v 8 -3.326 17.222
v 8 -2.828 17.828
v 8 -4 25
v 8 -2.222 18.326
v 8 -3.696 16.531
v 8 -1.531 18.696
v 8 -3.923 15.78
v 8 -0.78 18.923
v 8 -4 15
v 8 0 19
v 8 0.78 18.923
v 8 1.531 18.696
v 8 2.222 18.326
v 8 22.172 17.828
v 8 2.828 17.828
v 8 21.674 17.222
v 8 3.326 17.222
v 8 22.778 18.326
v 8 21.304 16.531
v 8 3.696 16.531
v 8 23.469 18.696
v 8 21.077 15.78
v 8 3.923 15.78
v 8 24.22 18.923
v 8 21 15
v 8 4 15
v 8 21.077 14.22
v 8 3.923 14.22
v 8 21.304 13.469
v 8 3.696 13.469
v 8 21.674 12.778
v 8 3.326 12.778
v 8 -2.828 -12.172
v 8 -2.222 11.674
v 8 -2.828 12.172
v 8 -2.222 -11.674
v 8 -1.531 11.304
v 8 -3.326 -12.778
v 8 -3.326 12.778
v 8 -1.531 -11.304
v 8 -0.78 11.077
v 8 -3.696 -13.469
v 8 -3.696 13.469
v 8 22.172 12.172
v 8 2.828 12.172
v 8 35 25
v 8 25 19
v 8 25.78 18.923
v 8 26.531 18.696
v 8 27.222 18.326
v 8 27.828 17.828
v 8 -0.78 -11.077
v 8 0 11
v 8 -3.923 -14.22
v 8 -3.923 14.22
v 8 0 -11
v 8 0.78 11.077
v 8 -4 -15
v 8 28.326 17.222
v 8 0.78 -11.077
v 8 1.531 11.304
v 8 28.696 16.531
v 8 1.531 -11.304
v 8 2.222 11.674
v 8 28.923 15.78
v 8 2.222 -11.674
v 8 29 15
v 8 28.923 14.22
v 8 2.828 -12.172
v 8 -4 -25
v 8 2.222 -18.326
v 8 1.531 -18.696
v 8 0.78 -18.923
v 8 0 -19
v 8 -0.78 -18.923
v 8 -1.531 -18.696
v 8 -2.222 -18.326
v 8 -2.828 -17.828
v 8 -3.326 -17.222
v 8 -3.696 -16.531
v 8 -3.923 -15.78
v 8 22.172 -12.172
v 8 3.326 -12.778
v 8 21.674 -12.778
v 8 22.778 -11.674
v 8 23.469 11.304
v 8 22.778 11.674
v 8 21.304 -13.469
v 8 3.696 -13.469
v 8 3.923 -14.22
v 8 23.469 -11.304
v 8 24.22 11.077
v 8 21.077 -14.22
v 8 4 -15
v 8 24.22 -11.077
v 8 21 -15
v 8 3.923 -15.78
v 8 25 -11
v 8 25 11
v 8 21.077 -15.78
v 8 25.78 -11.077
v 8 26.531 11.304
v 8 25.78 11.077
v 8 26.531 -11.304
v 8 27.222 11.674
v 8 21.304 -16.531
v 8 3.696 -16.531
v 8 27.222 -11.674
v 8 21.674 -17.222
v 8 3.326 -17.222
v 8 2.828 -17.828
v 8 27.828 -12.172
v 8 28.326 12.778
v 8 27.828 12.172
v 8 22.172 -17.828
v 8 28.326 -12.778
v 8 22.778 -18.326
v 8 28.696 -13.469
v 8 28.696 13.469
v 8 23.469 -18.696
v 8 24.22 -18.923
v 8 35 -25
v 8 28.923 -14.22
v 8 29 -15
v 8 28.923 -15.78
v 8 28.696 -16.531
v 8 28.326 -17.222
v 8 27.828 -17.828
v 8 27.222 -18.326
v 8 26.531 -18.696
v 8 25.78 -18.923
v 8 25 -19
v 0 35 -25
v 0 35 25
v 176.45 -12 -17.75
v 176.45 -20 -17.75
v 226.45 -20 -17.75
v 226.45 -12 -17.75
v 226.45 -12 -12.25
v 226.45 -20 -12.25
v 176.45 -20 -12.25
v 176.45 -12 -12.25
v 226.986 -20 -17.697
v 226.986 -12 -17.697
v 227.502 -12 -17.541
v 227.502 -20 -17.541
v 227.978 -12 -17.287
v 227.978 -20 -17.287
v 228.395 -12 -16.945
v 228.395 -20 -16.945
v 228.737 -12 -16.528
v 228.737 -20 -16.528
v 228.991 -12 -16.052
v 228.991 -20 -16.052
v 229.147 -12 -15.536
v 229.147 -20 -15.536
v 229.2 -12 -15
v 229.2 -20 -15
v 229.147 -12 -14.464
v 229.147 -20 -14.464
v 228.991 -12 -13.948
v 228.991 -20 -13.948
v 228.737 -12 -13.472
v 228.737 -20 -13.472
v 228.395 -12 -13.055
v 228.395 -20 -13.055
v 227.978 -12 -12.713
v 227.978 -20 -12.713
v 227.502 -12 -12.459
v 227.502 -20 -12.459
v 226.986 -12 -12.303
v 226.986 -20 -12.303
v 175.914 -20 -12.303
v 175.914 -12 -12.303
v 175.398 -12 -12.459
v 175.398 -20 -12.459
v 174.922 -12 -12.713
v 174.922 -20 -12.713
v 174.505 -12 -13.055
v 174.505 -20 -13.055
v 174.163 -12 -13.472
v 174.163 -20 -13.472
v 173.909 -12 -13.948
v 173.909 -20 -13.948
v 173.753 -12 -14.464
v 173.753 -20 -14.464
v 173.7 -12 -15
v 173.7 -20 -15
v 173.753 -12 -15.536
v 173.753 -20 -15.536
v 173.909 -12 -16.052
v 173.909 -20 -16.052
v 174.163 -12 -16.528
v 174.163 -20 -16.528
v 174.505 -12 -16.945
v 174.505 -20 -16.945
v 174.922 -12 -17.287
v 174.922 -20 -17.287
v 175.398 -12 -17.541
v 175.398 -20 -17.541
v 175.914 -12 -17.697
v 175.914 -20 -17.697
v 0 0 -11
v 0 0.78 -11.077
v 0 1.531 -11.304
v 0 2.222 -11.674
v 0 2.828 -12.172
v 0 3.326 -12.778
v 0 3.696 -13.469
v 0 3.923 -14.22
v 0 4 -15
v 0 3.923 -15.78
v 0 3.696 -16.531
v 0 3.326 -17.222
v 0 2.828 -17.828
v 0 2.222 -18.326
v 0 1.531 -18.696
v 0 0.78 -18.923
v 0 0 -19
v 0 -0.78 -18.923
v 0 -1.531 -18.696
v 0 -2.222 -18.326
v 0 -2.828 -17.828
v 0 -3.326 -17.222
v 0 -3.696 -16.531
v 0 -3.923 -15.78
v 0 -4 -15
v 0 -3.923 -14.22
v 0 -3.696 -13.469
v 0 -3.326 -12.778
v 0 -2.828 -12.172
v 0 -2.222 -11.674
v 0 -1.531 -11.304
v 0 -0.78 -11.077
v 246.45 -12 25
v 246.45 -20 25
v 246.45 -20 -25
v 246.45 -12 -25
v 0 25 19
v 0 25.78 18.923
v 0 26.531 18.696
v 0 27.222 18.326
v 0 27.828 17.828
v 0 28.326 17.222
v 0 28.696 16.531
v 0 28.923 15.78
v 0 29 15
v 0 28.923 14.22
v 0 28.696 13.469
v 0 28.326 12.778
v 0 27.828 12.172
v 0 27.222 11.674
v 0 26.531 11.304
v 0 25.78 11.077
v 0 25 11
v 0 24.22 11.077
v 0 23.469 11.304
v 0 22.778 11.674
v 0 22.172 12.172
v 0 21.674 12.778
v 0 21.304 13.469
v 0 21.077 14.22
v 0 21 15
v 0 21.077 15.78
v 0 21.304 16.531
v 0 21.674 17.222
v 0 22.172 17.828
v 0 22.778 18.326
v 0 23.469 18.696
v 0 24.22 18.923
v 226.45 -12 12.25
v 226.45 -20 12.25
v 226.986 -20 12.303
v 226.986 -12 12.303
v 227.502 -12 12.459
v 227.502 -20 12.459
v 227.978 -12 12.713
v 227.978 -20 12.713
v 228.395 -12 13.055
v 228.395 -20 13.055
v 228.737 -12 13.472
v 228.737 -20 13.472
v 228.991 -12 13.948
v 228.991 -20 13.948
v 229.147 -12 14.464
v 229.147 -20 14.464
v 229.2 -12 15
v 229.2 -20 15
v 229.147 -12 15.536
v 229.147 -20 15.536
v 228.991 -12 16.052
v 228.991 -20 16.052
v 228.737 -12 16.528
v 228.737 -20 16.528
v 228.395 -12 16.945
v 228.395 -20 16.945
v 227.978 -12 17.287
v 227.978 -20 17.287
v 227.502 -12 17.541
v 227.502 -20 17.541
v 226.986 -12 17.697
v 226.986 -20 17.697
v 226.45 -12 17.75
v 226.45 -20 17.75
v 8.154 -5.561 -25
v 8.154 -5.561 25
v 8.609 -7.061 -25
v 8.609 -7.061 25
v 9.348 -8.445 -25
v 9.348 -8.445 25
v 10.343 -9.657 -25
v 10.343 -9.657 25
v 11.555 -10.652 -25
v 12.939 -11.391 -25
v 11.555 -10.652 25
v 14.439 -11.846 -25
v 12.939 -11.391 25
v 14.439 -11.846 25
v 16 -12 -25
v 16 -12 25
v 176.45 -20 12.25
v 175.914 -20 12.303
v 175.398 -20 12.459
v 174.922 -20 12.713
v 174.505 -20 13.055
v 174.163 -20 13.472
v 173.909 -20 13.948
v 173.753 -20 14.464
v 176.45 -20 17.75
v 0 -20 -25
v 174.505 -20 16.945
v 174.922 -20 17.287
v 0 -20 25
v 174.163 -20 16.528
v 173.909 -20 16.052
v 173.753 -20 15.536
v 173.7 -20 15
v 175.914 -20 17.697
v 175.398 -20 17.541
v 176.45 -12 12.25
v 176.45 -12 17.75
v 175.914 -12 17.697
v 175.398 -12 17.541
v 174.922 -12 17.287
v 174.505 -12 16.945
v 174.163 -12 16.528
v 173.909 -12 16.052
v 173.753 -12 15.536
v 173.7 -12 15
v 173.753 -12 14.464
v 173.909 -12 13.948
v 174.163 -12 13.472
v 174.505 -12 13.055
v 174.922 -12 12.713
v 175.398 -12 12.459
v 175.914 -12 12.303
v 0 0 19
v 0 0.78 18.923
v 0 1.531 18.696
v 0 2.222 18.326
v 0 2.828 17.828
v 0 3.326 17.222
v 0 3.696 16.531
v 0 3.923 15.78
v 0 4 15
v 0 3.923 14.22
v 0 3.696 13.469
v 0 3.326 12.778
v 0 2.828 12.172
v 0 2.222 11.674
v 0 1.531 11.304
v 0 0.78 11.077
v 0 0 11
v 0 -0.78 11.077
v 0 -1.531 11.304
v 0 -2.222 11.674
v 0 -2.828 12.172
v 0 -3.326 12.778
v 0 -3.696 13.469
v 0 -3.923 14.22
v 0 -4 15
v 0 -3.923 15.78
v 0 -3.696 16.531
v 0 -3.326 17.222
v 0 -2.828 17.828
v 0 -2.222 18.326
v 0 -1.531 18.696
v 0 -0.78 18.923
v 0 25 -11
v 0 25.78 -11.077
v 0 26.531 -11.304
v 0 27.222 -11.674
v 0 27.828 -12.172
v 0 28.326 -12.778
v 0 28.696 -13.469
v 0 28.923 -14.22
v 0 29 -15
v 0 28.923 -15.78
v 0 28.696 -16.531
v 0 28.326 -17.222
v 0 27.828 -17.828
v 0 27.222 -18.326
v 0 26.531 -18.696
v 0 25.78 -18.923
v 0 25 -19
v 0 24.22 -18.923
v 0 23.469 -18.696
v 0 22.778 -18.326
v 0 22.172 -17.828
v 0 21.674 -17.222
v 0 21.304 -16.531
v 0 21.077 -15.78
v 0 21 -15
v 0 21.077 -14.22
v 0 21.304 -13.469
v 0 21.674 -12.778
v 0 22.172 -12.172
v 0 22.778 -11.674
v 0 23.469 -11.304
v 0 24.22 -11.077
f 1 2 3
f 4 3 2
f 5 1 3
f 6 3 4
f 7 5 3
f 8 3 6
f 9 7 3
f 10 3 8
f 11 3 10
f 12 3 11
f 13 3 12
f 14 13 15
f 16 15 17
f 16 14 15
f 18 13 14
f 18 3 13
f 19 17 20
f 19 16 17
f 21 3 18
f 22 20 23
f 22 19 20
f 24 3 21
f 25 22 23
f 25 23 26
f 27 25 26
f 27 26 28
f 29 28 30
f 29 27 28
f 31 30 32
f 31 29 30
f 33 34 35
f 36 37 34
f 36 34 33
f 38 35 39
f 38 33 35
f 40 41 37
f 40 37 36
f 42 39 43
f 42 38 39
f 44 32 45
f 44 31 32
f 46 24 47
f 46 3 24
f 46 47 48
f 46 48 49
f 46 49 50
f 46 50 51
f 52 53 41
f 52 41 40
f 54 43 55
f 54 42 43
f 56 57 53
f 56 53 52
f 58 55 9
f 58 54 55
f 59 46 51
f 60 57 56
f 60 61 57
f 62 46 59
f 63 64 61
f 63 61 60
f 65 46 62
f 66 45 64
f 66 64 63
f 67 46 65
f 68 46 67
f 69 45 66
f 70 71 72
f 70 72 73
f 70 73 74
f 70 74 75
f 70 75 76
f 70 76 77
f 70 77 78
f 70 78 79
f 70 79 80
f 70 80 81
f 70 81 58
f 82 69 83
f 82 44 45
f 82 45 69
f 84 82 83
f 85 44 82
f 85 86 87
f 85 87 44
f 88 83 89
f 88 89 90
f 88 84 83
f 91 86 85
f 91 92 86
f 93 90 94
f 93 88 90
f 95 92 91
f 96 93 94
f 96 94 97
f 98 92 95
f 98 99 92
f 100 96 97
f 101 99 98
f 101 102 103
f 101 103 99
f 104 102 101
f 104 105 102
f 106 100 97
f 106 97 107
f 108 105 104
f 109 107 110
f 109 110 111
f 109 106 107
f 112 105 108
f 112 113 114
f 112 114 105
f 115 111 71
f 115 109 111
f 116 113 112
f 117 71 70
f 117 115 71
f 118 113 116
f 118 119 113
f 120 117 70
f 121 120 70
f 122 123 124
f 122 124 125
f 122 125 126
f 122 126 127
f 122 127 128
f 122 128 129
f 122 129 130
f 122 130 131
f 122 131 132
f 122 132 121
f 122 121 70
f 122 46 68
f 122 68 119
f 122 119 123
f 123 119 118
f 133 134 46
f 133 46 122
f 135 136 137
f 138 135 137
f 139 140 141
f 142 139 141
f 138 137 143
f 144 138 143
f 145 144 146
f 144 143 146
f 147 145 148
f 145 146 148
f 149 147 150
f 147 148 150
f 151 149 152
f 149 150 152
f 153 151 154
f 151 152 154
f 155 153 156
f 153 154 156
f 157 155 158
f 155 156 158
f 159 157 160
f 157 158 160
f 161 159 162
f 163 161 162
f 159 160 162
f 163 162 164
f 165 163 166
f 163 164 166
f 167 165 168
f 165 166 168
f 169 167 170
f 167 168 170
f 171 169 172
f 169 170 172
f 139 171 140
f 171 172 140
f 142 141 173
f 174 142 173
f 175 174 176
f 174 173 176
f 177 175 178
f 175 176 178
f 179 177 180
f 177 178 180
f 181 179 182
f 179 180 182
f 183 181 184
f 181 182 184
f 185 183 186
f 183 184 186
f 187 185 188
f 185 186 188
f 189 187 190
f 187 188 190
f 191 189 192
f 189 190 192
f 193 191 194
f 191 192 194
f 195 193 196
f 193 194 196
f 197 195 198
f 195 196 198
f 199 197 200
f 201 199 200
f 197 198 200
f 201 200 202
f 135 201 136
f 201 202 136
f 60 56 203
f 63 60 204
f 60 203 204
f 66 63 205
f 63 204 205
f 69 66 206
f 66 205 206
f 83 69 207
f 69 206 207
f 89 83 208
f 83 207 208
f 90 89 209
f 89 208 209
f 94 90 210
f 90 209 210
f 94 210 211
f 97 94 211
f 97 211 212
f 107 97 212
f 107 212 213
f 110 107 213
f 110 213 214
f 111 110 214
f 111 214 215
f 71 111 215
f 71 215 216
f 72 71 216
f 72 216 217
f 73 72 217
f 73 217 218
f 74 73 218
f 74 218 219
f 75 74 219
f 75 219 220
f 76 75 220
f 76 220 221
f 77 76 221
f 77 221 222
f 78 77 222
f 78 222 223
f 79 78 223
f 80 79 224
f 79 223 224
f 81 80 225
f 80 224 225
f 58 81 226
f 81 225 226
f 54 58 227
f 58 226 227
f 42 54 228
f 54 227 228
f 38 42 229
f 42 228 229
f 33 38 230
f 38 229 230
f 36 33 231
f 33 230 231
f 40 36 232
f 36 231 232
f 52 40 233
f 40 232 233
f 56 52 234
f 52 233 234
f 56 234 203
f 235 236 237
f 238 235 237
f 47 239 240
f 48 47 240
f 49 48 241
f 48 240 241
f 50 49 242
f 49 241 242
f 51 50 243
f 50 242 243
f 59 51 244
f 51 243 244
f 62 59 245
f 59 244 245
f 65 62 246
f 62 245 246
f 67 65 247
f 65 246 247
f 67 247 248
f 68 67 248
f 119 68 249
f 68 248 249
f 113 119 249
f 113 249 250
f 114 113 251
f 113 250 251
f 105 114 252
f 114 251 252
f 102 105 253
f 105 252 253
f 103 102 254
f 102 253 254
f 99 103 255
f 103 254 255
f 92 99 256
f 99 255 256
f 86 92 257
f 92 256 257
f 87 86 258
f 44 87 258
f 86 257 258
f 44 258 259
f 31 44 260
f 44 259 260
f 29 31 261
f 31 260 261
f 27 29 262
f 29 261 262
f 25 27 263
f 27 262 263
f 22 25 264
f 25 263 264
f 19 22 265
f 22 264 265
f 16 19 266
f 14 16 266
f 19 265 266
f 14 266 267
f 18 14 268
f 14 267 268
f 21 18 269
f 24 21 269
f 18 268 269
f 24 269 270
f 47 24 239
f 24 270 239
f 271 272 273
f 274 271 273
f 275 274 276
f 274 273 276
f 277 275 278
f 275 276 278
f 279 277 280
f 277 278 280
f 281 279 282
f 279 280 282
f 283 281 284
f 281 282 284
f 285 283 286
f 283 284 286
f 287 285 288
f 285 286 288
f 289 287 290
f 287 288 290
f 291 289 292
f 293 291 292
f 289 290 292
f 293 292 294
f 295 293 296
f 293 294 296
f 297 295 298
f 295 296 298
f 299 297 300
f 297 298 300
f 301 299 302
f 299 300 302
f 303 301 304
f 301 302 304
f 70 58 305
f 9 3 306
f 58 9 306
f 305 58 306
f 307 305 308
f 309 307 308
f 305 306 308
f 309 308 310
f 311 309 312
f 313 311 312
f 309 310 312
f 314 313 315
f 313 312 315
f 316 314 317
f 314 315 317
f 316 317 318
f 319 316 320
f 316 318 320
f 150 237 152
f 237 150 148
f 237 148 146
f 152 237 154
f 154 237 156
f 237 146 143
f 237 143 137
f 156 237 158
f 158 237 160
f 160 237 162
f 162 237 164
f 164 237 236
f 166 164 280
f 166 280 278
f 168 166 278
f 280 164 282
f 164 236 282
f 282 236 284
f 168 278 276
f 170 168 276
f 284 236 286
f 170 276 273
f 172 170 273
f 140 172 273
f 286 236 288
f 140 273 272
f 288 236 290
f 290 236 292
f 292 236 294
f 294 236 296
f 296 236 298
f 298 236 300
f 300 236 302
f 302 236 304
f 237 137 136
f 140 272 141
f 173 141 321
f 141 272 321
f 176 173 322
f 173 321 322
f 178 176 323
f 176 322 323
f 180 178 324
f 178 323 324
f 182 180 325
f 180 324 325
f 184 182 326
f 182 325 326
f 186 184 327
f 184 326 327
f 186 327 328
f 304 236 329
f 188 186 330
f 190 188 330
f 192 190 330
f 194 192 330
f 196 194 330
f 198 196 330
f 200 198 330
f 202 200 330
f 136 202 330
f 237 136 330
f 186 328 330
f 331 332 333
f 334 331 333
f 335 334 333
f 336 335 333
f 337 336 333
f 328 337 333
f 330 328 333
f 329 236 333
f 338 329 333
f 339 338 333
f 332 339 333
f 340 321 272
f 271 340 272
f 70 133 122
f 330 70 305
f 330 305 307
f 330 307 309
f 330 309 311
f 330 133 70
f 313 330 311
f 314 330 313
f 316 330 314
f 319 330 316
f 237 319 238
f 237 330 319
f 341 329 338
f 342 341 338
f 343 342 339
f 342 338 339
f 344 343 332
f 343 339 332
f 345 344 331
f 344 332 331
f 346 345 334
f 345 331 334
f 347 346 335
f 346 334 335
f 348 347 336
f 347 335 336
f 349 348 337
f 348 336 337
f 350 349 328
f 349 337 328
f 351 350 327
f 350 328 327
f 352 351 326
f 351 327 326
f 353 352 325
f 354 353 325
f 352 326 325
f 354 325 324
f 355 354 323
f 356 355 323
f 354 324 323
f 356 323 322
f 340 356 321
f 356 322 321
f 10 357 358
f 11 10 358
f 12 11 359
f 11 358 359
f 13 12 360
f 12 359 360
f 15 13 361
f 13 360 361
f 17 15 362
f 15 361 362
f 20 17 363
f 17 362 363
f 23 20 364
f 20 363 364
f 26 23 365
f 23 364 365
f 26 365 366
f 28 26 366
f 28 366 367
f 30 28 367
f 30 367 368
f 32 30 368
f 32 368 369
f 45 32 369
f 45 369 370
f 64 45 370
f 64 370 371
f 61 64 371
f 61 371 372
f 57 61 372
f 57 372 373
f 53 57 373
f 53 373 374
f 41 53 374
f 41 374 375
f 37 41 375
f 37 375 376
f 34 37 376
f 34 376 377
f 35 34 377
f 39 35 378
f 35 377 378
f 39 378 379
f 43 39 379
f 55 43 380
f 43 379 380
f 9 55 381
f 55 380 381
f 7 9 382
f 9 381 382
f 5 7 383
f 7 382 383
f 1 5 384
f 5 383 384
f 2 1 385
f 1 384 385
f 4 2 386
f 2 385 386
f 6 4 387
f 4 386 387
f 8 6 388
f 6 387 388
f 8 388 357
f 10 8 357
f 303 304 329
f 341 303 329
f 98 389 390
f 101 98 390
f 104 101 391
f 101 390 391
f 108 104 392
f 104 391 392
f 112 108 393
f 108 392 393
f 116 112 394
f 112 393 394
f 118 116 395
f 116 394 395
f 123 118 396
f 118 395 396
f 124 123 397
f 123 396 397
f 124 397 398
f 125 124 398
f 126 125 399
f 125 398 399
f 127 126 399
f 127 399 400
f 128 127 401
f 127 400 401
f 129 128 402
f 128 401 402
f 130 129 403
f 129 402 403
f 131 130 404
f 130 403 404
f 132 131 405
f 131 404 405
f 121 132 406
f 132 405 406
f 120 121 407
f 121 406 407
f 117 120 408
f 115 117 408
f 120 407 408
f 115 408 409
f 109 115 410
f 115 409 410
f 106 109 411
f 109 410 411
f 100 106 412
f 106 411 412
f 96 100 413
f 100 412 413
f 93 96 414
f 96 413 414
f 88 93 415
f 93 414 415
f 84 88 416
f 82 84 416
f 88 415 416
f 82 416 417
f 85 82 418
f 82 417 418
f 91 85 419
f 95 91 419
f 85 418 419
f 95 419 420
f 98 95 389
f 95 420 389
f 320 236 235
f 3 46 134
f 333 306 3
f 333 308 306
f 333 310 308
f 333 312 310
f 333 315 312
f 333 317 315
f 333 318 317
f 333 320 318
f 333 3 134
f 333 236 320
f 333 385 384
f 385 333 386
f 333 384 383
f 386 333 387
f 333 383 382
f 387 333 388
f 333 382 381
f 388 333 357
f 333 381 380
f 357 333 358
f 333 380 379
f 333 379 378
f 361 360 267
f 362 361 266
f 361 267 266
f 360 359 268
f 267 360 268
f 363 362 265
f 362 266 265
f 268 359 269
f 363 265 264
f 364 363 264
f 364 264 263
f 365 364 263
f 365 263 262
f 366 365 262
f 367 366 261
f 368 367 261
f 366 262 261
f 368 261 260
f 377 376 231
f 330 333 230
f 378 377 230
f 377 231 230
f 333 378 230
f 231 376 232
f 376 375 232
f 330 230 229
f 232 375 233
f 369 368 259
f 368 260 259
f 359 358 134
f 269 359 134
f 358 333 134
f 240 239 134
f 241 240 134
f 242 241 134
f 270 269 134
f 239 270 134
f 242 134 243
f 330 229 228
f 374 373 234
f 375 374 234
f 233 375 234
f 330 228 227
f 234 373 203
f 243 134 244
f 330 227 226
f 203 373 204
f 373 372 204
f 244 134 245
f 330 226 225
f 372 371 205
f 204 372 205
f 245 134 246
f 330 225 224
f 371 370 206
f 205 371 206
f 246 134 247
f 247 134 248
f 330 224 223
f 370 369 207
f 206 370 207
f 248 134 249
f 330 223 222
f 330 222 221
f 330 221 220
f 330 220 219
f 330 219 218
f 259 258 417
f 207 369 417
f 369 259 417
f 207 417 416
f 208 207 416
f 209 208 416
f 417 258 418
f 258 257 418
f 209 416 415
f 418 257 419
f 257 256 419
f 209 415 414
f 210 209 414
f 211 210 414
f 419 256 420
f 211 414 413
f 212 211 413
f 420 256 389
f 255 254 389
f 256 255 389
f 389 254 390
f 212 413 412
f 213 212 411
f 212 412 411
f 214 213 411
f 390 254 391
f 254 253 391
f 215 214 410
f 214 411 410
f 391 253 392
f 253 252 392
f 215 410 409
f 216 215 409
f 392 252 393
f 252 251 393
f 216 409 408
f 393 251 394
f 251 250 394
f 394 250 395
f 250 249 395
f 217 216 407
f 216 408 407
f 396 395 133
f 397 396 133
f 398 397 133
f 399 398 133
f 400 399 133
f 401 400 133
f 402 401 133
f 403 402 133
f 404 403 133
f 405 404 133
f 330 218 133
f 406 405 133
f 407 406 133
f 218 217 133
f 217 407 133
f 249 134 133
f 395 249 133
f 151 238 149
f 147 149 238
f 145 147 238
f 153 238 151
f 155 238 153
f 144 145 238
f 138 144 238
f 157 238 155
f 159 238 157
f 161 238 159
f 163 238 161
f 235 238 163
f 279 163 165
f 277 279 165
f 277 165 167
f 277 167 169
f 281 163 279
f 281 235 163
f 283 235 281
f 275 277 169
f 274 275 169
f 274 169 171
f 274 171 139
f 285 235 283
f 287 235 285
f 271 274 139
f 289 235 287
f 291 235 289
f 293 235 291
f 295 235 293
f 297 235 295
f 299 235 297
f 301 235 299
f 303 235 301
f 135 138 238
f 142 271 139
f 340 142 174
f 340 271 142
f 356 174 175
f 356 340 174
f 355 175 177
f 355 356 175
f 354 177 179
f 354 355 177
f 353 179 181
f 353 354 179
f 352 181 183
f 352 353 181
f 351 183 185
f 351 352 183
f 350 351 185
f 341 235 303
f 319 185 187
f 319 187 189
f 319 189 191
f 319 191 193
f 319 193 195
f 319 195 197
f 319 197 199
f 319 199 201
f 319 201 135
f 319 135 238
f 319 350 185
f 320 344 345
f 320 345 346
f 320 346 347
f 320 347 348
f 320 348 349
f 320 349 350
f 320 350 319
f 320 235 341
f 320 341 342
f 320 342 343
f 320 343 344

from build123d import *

# Parameters (mm, degrees)
SKETCH_1_W          = 50
SKETCH_1_H          = 55
EXTRUDE_1_DEPTH     = 8
EXTRUDE_2_DEPTH     = 8
FILLET_1_R          = 8
CUT_EXTRUDE_1_DEPTH = 8
SKETCH_4_R          = 4
CUT_EXTRUDE_2_DEPTH = 8


with BuildPart() as part:
    # 草图1 → 凸台-拉伸1 (new body)
    with BuildSketch(Plane(origin=(0, 0, 0), x_dir=(0, 0, -1), z_dir=(1, 0, 0))):
        with Locations((0, 7.5)):
            Rectangle(SKETCH_1_W, SKETCH_1_H)
    extrude(amount=EXTRUDE_1_DEPTH)

    # 草图2 → 凸台-拉伸2 (add)
    with BuildSketch(Plane.XZ.offset(20)):
        Polygon((0, 25), (8, 25), (246.45, 25), (246.45, -25), (8, -25), (0, -25), align=None)
    extrude(amount=-EXTRUDE_2_DEPTH)

    # 圆角1
    fillet_1_edges = [part.edges().sort_by_distance(p)[0] for p in [
        (8, -12, 0),
    ]]
    fillet(fillet_1_edges, radius=FILLET_1_R)

    # 草图3 → 切除-拉伸1 (cut)
    with BuildSketch(Plane.XZ.offset(20)):
        with BuildLine():
            Line((176.45, -17.75), (226.45, -17.75))
            ThreePointArc((226.45, -17.75), (229.2, -15), (226.45, -12.25))
            Line((226.45, -12.25), (176.450000009, -12.25))
            ThreePointArc((176.450000009, -12.25), (173.7, -14.999999996), (176.45, -17.75))
        make_face()
        with BuildLine():
            Line((176.449999995, 12.25), (226.45, 12.25))
            ThreePointArc((226.45, 12.25), (229.2, 15), (226.45, 17.75))
            Line((226.45, 17.75), (176.45, 17.75))
            ThreePointArc((176.45, 17.75), (173.7, 15.000000003), (176.449999995, 12.25))
        make_face()
    extrude(amount=-CUT_EXTRUDE_1_DEPTH, mode=Mode.SUBTRACT)

    # 草图4 → 切除-拉伸2 (cut)
    with BuildSketch(Plane.ZY):
        with Locations((-15, 25)):
            Circle(SKETCH_4_R)
        with Locations((-15, 0)):
            Circle(SKETCH_4_R)
        with Locations((15, 25)):
            Circle(SKETCH_4_R)
        with Locations((15, 0)):
            Circle(SKETCH_4_R)
    extrude(amount=-CUT_EXTRUDE_2_DEPTH, mode=Mode.SUBTRACT)


solid = part.part
